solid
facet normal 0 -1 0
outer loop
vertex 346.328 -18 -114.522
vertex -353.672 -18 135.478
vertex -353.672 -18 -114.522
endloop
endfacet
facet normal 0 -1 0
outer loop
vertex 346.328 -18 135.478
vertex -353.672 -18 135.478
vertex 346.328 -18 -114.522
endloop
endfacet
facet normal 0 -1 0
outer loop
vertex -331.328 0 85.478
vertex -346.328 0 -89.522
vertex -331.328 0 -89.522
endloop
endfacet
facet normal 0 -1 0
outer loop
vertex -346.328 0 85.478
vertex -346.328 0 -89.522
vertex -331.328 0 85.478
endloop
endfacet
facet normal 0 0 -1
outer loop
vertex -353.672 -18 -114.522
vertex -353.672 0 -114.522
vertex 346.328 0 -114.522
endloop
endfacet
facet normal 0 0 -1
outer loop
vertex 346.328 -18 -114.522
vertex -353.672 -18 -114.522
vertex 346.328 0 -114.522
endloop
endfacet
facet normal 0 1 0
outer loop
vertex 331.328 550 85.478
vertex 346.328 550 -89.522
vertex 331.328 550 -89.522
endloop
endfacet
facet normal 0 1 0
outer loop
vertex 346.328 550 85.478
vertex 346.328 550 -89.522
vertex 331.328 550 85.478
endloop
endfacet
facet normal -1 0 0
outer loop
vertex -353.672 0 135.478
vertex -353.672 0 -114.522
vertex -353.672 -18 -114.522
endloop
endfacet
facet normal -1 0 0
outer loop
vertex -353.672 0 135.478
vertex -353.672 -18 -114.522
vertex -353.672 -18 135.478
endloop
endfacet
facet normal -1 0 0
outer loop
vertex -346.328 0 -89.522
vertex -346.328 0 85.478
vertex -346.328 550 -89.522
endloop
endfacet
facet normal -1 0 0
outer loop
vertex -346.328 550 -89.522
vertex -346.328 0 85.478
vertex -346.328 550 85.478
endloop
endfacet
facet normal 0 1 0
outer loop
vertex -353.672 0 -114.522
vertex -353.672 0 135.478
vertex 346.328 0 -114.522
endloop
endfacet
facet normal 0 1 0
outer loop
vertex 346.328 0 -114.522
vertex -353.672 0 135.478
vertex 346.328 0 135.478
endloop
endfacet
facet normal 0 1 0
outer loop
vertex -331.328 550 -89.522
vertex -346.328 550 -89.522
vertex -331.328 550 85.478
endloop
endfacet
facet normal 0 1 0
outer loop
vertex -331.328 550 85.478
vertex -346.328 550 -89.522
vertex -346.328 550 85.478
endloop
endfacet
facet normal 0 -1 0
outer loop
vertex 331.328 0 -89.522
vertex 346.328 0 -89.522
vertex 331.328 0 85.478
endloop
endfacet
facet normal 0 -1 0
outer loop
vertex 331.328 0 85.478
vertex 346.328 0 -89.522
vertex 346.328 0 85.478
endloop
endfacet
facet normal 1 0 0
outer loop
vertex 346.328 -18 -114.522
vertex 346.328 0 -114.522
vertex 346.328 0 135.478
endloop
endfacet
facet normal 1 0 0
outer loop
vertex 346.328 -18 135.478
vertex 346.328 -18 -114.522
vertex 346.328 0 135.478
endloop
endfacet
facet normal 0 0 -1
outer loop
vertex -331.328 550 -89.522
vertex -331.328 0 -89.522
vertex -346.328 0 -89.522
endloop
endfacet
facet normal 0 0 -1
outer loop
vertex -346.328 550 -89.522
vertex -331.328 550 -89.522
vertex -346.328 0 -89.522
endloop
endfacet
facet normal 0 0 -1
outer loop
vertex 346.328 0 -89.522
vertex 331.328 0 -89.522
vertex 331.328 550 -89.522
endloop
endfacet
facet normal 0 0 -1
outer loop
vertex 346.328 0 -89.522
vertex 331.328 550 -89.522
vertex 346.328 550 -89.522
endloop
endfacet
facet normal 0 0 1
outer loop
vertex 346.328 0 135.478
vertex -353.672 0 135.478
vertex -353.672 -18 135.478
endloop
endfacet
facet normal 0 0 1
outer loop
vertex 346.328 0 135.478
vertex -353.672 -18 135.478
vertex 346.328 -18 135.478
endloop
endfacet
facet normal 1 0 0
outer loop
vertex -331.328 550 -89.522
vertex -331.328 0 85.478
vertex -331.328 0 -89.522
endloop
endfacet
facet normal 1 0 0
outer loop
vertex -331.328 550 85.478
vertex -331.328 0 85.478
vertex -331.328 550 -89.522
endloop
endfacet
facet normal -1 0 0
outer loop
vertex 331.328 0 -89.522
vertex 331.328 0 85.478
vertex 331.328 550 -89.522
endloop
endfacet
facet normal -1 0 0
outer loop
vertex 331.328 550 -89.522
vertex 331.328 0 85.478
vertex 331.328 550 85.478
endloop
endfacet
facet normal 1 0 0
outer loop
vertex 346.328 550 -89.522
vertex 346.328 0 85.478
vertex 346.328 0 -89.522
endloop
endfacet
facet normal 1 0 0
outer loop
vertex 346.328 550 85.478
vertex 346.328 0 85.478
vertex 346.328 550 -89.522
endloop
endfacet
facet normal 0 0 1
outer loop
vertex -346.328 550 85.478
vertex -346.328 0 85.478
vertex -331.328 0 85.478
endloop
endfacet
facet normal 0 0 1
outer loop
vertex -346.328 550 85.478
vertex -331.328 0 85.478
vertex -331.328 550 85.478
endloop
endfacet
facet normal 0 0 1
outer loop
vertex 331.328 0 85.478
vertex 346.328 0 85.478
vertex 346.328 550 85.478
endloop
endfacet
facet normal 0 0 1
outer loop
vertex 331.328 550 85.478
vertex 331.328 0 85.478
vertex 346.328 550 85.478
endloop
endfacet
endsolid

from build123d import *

# Parameters (mm, degrees)
F0_W      = 700
F0_H      = 250
F1_DEPTH  = 18
F2_W      = 550
F2_H      = 200
F3_DEPTH  = 15
F3_FACE_W = 15
F3_FACE_H = 550
F4_DEPTH  = 25


with BuildPart() as f1:
    # F0 (on Front) → F1 (new body)
    with BuildSketch(Plane.XZ):
        with Locations((-3.67187, 10.478279)):
            Rectangle(F0_W, F0_H)
    extrude(amount=F1_DEPTH)


with BuildPart() as f3:
    # F2 (on face) → F3 (new body)
    with BuildSketch(Plane.YZ.offset(346.32813)):
        with Locations((275, -14.521721)):
            Rectangle(F2_W, F2_H)
    extrude(amount=-F3_DEPTH)

    # F3_face (on face) → F4 (cut)
    with BuildSketch(Plane(origin=(338.82813, 275, -114.521721), x_dir=(1, 0, 0), z_dir=(0, 0, -1))):
        Rectangle(F3_FACE_W, F3_FACE_H)
    extrude(amount=-F4_DEPTH, mode=Mode.SUBTRACT)


with BuildPart() as f5_1:
    # F5: instance of F3
    add(f3.part.mirror(Plane.YZ))


solid = Compound([f1.part, f3.part, f5_1.part])
